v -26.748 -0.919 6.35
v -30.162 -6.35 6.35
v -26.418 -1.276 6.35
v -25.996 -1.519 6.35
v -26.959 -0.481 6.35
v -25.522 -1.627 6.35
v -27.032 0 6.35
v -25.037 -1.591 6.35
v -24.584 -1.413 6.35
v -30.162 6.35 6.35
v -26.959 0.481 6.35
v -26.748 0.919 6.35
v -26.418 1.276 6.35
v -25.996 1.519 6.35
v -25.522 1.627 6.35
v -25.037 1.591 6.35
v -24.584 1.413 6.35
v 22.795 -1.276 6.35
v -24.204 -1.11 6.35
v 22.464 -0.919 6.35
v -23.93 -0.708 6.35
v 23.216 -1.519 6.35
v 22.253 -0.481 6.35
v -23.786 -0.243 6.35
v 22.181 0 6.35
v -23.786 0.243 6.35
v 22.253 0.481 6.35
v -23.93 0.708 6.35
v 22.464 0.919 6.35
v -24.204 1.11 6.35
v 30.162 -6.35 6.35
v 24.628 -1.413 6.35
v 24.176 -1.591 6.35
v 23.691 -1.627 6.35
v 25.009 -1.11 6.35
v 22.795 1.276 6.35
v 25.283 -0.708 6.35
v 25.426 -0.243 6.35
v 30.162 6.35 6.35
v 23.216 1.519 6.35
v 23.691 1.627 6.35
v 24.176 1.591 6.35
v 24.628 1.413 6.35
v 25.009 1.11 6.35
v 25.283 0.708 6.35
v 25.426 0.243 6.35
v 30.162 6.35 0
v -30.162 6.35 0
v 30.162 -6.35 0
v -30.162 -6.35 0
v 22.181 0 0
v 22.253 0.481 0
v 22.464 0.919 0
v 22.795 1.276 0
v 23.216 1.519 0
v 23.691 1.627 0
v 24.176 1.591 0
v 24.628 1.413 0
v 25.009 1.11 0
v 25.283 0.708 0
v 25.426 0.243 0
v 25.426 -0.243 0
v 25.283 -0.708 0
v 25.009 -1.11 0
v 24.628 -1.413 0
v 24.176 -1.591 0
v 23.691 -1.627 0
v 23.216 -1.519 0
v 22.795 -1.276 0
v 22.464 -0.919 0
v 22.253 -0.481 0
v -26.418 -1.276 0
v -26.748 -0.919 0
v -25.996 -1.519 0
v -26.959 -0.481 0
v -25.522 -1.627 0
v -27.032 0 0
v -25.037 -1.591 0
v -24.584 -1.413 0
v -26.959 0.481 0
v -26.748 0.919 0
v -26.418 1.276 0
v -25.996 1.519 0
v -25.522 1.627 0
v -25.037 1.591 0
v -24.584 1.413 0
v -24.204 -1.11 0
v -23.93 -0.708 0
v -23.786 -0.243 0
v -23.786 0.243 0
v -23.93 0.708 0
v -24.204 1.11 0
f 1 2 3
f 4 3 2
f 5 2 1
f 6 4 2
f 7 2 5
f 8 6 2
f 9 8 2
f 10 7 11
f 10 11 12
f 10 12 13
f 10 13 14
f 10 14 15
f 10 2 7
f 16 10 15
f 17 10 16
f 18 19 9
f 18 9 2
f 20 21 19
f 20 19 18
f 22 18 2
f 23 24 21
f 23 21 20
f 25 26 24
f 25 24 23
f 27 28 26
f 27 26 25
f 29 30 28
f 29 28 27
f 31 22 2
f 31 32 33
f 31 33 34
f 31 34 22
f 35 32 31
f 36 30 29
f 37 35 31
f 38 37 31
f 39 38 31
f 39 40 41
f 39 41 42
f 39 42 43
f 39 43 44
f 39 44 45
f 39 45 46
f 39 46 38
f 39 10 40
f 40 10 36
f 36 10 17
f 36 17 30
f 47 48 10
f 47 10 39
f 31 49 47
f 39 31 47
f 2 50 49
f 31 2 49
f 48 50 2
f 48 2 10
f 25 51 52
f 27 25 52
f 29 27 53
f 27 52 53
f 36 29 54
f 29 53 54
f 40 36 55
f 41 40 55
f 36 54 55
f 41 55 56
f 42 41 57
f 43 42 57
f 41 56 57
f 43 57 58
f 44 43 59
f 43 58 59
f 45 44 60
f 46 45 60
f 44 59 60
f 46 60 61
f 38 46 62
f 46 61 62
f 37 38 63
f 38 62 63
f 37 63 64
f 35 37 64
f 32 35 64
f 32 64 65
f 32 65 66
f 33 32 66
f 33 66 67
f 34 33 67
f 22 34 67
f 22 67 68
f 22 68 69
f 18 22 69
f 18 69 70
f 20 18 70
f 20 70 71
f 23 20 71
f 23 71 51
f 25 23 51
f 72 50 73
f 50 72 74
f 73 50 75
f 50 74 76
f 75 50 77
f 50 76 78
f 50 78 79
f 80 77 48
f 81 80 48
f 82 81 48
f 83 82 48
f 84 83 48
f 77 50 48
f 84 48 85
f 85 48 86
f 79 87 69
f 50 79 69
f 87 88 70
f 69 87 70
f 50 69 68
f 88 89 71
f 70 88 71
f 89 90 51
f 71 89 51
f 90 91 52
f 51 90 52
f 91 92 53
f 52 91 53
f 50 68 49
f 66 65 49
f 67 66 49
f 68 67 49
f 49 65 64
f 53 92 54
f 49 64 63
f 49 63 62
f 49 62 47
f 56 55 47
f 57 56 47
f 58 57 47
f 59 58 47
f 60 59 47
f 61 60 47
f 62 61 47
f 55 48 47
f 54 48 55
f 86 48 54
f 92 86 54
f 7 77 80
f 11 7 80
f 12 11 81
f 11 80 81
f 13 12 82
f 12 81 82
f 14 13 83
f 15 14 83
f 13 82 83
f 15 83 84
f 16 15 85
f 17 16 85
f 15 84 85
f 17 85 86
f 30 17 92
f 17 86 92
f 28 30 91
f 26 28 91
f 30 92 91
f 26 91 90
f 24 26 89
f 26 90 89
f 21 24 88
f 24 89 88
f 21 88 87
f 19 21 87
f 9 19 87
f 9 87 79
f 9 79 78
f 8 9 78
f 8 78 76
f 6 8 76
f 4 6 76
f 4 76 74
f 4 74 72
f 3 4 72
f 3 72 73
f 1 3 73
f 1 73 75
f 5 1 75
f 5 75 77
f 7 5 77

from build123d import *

# Parameters (mm, degrees)
SKETCH1_W                 = 60.325
SKETCH1_H                 = 12.7
BOSS_EXTRUDE1_DEPTH       = 6.35
F_4_CLEARANCE_HOLE1_D     = 3.2639
F_4_CLEARANCE_HOLE1_DEPTH = 12.7
F_4_CLEARANCE_HOLE1_TIP   = 0.980574487


with BuildPart() as part:
    # Sketch1 → Boss-Extrude1 (new body)
    with BuildSketch(Plane.XY):
        Rectangle(SKETCH1_W, SKETCH1_H)
    extrude(amount=BOSS_EXTRUDE1_DEPTH)

    # #4 Clearance Hole1
    with Locations(Plane.XY.offset(6.35)):
        with Locations((-25.4, 0), (23.8125, 0)):
            Hole(F_4_CLEARANCE_HOLE1_D / 2, depth=F_4_CLEARANCE_HOLE1_DEPTH)
            with Locations((0, 0, -(F_4_CLEARANCE_HOLE1_DEPTH + F_4_CLEARANCE_HOLE1_TIP / 2))):  # 118° drill point
                Cone(0, F_4_CLEARANCE_HOLE1_D / 2, F_4_CLEARANCE_HOLE1_TIP, mode=Mode.SUBTRACT)


solid = part.part
